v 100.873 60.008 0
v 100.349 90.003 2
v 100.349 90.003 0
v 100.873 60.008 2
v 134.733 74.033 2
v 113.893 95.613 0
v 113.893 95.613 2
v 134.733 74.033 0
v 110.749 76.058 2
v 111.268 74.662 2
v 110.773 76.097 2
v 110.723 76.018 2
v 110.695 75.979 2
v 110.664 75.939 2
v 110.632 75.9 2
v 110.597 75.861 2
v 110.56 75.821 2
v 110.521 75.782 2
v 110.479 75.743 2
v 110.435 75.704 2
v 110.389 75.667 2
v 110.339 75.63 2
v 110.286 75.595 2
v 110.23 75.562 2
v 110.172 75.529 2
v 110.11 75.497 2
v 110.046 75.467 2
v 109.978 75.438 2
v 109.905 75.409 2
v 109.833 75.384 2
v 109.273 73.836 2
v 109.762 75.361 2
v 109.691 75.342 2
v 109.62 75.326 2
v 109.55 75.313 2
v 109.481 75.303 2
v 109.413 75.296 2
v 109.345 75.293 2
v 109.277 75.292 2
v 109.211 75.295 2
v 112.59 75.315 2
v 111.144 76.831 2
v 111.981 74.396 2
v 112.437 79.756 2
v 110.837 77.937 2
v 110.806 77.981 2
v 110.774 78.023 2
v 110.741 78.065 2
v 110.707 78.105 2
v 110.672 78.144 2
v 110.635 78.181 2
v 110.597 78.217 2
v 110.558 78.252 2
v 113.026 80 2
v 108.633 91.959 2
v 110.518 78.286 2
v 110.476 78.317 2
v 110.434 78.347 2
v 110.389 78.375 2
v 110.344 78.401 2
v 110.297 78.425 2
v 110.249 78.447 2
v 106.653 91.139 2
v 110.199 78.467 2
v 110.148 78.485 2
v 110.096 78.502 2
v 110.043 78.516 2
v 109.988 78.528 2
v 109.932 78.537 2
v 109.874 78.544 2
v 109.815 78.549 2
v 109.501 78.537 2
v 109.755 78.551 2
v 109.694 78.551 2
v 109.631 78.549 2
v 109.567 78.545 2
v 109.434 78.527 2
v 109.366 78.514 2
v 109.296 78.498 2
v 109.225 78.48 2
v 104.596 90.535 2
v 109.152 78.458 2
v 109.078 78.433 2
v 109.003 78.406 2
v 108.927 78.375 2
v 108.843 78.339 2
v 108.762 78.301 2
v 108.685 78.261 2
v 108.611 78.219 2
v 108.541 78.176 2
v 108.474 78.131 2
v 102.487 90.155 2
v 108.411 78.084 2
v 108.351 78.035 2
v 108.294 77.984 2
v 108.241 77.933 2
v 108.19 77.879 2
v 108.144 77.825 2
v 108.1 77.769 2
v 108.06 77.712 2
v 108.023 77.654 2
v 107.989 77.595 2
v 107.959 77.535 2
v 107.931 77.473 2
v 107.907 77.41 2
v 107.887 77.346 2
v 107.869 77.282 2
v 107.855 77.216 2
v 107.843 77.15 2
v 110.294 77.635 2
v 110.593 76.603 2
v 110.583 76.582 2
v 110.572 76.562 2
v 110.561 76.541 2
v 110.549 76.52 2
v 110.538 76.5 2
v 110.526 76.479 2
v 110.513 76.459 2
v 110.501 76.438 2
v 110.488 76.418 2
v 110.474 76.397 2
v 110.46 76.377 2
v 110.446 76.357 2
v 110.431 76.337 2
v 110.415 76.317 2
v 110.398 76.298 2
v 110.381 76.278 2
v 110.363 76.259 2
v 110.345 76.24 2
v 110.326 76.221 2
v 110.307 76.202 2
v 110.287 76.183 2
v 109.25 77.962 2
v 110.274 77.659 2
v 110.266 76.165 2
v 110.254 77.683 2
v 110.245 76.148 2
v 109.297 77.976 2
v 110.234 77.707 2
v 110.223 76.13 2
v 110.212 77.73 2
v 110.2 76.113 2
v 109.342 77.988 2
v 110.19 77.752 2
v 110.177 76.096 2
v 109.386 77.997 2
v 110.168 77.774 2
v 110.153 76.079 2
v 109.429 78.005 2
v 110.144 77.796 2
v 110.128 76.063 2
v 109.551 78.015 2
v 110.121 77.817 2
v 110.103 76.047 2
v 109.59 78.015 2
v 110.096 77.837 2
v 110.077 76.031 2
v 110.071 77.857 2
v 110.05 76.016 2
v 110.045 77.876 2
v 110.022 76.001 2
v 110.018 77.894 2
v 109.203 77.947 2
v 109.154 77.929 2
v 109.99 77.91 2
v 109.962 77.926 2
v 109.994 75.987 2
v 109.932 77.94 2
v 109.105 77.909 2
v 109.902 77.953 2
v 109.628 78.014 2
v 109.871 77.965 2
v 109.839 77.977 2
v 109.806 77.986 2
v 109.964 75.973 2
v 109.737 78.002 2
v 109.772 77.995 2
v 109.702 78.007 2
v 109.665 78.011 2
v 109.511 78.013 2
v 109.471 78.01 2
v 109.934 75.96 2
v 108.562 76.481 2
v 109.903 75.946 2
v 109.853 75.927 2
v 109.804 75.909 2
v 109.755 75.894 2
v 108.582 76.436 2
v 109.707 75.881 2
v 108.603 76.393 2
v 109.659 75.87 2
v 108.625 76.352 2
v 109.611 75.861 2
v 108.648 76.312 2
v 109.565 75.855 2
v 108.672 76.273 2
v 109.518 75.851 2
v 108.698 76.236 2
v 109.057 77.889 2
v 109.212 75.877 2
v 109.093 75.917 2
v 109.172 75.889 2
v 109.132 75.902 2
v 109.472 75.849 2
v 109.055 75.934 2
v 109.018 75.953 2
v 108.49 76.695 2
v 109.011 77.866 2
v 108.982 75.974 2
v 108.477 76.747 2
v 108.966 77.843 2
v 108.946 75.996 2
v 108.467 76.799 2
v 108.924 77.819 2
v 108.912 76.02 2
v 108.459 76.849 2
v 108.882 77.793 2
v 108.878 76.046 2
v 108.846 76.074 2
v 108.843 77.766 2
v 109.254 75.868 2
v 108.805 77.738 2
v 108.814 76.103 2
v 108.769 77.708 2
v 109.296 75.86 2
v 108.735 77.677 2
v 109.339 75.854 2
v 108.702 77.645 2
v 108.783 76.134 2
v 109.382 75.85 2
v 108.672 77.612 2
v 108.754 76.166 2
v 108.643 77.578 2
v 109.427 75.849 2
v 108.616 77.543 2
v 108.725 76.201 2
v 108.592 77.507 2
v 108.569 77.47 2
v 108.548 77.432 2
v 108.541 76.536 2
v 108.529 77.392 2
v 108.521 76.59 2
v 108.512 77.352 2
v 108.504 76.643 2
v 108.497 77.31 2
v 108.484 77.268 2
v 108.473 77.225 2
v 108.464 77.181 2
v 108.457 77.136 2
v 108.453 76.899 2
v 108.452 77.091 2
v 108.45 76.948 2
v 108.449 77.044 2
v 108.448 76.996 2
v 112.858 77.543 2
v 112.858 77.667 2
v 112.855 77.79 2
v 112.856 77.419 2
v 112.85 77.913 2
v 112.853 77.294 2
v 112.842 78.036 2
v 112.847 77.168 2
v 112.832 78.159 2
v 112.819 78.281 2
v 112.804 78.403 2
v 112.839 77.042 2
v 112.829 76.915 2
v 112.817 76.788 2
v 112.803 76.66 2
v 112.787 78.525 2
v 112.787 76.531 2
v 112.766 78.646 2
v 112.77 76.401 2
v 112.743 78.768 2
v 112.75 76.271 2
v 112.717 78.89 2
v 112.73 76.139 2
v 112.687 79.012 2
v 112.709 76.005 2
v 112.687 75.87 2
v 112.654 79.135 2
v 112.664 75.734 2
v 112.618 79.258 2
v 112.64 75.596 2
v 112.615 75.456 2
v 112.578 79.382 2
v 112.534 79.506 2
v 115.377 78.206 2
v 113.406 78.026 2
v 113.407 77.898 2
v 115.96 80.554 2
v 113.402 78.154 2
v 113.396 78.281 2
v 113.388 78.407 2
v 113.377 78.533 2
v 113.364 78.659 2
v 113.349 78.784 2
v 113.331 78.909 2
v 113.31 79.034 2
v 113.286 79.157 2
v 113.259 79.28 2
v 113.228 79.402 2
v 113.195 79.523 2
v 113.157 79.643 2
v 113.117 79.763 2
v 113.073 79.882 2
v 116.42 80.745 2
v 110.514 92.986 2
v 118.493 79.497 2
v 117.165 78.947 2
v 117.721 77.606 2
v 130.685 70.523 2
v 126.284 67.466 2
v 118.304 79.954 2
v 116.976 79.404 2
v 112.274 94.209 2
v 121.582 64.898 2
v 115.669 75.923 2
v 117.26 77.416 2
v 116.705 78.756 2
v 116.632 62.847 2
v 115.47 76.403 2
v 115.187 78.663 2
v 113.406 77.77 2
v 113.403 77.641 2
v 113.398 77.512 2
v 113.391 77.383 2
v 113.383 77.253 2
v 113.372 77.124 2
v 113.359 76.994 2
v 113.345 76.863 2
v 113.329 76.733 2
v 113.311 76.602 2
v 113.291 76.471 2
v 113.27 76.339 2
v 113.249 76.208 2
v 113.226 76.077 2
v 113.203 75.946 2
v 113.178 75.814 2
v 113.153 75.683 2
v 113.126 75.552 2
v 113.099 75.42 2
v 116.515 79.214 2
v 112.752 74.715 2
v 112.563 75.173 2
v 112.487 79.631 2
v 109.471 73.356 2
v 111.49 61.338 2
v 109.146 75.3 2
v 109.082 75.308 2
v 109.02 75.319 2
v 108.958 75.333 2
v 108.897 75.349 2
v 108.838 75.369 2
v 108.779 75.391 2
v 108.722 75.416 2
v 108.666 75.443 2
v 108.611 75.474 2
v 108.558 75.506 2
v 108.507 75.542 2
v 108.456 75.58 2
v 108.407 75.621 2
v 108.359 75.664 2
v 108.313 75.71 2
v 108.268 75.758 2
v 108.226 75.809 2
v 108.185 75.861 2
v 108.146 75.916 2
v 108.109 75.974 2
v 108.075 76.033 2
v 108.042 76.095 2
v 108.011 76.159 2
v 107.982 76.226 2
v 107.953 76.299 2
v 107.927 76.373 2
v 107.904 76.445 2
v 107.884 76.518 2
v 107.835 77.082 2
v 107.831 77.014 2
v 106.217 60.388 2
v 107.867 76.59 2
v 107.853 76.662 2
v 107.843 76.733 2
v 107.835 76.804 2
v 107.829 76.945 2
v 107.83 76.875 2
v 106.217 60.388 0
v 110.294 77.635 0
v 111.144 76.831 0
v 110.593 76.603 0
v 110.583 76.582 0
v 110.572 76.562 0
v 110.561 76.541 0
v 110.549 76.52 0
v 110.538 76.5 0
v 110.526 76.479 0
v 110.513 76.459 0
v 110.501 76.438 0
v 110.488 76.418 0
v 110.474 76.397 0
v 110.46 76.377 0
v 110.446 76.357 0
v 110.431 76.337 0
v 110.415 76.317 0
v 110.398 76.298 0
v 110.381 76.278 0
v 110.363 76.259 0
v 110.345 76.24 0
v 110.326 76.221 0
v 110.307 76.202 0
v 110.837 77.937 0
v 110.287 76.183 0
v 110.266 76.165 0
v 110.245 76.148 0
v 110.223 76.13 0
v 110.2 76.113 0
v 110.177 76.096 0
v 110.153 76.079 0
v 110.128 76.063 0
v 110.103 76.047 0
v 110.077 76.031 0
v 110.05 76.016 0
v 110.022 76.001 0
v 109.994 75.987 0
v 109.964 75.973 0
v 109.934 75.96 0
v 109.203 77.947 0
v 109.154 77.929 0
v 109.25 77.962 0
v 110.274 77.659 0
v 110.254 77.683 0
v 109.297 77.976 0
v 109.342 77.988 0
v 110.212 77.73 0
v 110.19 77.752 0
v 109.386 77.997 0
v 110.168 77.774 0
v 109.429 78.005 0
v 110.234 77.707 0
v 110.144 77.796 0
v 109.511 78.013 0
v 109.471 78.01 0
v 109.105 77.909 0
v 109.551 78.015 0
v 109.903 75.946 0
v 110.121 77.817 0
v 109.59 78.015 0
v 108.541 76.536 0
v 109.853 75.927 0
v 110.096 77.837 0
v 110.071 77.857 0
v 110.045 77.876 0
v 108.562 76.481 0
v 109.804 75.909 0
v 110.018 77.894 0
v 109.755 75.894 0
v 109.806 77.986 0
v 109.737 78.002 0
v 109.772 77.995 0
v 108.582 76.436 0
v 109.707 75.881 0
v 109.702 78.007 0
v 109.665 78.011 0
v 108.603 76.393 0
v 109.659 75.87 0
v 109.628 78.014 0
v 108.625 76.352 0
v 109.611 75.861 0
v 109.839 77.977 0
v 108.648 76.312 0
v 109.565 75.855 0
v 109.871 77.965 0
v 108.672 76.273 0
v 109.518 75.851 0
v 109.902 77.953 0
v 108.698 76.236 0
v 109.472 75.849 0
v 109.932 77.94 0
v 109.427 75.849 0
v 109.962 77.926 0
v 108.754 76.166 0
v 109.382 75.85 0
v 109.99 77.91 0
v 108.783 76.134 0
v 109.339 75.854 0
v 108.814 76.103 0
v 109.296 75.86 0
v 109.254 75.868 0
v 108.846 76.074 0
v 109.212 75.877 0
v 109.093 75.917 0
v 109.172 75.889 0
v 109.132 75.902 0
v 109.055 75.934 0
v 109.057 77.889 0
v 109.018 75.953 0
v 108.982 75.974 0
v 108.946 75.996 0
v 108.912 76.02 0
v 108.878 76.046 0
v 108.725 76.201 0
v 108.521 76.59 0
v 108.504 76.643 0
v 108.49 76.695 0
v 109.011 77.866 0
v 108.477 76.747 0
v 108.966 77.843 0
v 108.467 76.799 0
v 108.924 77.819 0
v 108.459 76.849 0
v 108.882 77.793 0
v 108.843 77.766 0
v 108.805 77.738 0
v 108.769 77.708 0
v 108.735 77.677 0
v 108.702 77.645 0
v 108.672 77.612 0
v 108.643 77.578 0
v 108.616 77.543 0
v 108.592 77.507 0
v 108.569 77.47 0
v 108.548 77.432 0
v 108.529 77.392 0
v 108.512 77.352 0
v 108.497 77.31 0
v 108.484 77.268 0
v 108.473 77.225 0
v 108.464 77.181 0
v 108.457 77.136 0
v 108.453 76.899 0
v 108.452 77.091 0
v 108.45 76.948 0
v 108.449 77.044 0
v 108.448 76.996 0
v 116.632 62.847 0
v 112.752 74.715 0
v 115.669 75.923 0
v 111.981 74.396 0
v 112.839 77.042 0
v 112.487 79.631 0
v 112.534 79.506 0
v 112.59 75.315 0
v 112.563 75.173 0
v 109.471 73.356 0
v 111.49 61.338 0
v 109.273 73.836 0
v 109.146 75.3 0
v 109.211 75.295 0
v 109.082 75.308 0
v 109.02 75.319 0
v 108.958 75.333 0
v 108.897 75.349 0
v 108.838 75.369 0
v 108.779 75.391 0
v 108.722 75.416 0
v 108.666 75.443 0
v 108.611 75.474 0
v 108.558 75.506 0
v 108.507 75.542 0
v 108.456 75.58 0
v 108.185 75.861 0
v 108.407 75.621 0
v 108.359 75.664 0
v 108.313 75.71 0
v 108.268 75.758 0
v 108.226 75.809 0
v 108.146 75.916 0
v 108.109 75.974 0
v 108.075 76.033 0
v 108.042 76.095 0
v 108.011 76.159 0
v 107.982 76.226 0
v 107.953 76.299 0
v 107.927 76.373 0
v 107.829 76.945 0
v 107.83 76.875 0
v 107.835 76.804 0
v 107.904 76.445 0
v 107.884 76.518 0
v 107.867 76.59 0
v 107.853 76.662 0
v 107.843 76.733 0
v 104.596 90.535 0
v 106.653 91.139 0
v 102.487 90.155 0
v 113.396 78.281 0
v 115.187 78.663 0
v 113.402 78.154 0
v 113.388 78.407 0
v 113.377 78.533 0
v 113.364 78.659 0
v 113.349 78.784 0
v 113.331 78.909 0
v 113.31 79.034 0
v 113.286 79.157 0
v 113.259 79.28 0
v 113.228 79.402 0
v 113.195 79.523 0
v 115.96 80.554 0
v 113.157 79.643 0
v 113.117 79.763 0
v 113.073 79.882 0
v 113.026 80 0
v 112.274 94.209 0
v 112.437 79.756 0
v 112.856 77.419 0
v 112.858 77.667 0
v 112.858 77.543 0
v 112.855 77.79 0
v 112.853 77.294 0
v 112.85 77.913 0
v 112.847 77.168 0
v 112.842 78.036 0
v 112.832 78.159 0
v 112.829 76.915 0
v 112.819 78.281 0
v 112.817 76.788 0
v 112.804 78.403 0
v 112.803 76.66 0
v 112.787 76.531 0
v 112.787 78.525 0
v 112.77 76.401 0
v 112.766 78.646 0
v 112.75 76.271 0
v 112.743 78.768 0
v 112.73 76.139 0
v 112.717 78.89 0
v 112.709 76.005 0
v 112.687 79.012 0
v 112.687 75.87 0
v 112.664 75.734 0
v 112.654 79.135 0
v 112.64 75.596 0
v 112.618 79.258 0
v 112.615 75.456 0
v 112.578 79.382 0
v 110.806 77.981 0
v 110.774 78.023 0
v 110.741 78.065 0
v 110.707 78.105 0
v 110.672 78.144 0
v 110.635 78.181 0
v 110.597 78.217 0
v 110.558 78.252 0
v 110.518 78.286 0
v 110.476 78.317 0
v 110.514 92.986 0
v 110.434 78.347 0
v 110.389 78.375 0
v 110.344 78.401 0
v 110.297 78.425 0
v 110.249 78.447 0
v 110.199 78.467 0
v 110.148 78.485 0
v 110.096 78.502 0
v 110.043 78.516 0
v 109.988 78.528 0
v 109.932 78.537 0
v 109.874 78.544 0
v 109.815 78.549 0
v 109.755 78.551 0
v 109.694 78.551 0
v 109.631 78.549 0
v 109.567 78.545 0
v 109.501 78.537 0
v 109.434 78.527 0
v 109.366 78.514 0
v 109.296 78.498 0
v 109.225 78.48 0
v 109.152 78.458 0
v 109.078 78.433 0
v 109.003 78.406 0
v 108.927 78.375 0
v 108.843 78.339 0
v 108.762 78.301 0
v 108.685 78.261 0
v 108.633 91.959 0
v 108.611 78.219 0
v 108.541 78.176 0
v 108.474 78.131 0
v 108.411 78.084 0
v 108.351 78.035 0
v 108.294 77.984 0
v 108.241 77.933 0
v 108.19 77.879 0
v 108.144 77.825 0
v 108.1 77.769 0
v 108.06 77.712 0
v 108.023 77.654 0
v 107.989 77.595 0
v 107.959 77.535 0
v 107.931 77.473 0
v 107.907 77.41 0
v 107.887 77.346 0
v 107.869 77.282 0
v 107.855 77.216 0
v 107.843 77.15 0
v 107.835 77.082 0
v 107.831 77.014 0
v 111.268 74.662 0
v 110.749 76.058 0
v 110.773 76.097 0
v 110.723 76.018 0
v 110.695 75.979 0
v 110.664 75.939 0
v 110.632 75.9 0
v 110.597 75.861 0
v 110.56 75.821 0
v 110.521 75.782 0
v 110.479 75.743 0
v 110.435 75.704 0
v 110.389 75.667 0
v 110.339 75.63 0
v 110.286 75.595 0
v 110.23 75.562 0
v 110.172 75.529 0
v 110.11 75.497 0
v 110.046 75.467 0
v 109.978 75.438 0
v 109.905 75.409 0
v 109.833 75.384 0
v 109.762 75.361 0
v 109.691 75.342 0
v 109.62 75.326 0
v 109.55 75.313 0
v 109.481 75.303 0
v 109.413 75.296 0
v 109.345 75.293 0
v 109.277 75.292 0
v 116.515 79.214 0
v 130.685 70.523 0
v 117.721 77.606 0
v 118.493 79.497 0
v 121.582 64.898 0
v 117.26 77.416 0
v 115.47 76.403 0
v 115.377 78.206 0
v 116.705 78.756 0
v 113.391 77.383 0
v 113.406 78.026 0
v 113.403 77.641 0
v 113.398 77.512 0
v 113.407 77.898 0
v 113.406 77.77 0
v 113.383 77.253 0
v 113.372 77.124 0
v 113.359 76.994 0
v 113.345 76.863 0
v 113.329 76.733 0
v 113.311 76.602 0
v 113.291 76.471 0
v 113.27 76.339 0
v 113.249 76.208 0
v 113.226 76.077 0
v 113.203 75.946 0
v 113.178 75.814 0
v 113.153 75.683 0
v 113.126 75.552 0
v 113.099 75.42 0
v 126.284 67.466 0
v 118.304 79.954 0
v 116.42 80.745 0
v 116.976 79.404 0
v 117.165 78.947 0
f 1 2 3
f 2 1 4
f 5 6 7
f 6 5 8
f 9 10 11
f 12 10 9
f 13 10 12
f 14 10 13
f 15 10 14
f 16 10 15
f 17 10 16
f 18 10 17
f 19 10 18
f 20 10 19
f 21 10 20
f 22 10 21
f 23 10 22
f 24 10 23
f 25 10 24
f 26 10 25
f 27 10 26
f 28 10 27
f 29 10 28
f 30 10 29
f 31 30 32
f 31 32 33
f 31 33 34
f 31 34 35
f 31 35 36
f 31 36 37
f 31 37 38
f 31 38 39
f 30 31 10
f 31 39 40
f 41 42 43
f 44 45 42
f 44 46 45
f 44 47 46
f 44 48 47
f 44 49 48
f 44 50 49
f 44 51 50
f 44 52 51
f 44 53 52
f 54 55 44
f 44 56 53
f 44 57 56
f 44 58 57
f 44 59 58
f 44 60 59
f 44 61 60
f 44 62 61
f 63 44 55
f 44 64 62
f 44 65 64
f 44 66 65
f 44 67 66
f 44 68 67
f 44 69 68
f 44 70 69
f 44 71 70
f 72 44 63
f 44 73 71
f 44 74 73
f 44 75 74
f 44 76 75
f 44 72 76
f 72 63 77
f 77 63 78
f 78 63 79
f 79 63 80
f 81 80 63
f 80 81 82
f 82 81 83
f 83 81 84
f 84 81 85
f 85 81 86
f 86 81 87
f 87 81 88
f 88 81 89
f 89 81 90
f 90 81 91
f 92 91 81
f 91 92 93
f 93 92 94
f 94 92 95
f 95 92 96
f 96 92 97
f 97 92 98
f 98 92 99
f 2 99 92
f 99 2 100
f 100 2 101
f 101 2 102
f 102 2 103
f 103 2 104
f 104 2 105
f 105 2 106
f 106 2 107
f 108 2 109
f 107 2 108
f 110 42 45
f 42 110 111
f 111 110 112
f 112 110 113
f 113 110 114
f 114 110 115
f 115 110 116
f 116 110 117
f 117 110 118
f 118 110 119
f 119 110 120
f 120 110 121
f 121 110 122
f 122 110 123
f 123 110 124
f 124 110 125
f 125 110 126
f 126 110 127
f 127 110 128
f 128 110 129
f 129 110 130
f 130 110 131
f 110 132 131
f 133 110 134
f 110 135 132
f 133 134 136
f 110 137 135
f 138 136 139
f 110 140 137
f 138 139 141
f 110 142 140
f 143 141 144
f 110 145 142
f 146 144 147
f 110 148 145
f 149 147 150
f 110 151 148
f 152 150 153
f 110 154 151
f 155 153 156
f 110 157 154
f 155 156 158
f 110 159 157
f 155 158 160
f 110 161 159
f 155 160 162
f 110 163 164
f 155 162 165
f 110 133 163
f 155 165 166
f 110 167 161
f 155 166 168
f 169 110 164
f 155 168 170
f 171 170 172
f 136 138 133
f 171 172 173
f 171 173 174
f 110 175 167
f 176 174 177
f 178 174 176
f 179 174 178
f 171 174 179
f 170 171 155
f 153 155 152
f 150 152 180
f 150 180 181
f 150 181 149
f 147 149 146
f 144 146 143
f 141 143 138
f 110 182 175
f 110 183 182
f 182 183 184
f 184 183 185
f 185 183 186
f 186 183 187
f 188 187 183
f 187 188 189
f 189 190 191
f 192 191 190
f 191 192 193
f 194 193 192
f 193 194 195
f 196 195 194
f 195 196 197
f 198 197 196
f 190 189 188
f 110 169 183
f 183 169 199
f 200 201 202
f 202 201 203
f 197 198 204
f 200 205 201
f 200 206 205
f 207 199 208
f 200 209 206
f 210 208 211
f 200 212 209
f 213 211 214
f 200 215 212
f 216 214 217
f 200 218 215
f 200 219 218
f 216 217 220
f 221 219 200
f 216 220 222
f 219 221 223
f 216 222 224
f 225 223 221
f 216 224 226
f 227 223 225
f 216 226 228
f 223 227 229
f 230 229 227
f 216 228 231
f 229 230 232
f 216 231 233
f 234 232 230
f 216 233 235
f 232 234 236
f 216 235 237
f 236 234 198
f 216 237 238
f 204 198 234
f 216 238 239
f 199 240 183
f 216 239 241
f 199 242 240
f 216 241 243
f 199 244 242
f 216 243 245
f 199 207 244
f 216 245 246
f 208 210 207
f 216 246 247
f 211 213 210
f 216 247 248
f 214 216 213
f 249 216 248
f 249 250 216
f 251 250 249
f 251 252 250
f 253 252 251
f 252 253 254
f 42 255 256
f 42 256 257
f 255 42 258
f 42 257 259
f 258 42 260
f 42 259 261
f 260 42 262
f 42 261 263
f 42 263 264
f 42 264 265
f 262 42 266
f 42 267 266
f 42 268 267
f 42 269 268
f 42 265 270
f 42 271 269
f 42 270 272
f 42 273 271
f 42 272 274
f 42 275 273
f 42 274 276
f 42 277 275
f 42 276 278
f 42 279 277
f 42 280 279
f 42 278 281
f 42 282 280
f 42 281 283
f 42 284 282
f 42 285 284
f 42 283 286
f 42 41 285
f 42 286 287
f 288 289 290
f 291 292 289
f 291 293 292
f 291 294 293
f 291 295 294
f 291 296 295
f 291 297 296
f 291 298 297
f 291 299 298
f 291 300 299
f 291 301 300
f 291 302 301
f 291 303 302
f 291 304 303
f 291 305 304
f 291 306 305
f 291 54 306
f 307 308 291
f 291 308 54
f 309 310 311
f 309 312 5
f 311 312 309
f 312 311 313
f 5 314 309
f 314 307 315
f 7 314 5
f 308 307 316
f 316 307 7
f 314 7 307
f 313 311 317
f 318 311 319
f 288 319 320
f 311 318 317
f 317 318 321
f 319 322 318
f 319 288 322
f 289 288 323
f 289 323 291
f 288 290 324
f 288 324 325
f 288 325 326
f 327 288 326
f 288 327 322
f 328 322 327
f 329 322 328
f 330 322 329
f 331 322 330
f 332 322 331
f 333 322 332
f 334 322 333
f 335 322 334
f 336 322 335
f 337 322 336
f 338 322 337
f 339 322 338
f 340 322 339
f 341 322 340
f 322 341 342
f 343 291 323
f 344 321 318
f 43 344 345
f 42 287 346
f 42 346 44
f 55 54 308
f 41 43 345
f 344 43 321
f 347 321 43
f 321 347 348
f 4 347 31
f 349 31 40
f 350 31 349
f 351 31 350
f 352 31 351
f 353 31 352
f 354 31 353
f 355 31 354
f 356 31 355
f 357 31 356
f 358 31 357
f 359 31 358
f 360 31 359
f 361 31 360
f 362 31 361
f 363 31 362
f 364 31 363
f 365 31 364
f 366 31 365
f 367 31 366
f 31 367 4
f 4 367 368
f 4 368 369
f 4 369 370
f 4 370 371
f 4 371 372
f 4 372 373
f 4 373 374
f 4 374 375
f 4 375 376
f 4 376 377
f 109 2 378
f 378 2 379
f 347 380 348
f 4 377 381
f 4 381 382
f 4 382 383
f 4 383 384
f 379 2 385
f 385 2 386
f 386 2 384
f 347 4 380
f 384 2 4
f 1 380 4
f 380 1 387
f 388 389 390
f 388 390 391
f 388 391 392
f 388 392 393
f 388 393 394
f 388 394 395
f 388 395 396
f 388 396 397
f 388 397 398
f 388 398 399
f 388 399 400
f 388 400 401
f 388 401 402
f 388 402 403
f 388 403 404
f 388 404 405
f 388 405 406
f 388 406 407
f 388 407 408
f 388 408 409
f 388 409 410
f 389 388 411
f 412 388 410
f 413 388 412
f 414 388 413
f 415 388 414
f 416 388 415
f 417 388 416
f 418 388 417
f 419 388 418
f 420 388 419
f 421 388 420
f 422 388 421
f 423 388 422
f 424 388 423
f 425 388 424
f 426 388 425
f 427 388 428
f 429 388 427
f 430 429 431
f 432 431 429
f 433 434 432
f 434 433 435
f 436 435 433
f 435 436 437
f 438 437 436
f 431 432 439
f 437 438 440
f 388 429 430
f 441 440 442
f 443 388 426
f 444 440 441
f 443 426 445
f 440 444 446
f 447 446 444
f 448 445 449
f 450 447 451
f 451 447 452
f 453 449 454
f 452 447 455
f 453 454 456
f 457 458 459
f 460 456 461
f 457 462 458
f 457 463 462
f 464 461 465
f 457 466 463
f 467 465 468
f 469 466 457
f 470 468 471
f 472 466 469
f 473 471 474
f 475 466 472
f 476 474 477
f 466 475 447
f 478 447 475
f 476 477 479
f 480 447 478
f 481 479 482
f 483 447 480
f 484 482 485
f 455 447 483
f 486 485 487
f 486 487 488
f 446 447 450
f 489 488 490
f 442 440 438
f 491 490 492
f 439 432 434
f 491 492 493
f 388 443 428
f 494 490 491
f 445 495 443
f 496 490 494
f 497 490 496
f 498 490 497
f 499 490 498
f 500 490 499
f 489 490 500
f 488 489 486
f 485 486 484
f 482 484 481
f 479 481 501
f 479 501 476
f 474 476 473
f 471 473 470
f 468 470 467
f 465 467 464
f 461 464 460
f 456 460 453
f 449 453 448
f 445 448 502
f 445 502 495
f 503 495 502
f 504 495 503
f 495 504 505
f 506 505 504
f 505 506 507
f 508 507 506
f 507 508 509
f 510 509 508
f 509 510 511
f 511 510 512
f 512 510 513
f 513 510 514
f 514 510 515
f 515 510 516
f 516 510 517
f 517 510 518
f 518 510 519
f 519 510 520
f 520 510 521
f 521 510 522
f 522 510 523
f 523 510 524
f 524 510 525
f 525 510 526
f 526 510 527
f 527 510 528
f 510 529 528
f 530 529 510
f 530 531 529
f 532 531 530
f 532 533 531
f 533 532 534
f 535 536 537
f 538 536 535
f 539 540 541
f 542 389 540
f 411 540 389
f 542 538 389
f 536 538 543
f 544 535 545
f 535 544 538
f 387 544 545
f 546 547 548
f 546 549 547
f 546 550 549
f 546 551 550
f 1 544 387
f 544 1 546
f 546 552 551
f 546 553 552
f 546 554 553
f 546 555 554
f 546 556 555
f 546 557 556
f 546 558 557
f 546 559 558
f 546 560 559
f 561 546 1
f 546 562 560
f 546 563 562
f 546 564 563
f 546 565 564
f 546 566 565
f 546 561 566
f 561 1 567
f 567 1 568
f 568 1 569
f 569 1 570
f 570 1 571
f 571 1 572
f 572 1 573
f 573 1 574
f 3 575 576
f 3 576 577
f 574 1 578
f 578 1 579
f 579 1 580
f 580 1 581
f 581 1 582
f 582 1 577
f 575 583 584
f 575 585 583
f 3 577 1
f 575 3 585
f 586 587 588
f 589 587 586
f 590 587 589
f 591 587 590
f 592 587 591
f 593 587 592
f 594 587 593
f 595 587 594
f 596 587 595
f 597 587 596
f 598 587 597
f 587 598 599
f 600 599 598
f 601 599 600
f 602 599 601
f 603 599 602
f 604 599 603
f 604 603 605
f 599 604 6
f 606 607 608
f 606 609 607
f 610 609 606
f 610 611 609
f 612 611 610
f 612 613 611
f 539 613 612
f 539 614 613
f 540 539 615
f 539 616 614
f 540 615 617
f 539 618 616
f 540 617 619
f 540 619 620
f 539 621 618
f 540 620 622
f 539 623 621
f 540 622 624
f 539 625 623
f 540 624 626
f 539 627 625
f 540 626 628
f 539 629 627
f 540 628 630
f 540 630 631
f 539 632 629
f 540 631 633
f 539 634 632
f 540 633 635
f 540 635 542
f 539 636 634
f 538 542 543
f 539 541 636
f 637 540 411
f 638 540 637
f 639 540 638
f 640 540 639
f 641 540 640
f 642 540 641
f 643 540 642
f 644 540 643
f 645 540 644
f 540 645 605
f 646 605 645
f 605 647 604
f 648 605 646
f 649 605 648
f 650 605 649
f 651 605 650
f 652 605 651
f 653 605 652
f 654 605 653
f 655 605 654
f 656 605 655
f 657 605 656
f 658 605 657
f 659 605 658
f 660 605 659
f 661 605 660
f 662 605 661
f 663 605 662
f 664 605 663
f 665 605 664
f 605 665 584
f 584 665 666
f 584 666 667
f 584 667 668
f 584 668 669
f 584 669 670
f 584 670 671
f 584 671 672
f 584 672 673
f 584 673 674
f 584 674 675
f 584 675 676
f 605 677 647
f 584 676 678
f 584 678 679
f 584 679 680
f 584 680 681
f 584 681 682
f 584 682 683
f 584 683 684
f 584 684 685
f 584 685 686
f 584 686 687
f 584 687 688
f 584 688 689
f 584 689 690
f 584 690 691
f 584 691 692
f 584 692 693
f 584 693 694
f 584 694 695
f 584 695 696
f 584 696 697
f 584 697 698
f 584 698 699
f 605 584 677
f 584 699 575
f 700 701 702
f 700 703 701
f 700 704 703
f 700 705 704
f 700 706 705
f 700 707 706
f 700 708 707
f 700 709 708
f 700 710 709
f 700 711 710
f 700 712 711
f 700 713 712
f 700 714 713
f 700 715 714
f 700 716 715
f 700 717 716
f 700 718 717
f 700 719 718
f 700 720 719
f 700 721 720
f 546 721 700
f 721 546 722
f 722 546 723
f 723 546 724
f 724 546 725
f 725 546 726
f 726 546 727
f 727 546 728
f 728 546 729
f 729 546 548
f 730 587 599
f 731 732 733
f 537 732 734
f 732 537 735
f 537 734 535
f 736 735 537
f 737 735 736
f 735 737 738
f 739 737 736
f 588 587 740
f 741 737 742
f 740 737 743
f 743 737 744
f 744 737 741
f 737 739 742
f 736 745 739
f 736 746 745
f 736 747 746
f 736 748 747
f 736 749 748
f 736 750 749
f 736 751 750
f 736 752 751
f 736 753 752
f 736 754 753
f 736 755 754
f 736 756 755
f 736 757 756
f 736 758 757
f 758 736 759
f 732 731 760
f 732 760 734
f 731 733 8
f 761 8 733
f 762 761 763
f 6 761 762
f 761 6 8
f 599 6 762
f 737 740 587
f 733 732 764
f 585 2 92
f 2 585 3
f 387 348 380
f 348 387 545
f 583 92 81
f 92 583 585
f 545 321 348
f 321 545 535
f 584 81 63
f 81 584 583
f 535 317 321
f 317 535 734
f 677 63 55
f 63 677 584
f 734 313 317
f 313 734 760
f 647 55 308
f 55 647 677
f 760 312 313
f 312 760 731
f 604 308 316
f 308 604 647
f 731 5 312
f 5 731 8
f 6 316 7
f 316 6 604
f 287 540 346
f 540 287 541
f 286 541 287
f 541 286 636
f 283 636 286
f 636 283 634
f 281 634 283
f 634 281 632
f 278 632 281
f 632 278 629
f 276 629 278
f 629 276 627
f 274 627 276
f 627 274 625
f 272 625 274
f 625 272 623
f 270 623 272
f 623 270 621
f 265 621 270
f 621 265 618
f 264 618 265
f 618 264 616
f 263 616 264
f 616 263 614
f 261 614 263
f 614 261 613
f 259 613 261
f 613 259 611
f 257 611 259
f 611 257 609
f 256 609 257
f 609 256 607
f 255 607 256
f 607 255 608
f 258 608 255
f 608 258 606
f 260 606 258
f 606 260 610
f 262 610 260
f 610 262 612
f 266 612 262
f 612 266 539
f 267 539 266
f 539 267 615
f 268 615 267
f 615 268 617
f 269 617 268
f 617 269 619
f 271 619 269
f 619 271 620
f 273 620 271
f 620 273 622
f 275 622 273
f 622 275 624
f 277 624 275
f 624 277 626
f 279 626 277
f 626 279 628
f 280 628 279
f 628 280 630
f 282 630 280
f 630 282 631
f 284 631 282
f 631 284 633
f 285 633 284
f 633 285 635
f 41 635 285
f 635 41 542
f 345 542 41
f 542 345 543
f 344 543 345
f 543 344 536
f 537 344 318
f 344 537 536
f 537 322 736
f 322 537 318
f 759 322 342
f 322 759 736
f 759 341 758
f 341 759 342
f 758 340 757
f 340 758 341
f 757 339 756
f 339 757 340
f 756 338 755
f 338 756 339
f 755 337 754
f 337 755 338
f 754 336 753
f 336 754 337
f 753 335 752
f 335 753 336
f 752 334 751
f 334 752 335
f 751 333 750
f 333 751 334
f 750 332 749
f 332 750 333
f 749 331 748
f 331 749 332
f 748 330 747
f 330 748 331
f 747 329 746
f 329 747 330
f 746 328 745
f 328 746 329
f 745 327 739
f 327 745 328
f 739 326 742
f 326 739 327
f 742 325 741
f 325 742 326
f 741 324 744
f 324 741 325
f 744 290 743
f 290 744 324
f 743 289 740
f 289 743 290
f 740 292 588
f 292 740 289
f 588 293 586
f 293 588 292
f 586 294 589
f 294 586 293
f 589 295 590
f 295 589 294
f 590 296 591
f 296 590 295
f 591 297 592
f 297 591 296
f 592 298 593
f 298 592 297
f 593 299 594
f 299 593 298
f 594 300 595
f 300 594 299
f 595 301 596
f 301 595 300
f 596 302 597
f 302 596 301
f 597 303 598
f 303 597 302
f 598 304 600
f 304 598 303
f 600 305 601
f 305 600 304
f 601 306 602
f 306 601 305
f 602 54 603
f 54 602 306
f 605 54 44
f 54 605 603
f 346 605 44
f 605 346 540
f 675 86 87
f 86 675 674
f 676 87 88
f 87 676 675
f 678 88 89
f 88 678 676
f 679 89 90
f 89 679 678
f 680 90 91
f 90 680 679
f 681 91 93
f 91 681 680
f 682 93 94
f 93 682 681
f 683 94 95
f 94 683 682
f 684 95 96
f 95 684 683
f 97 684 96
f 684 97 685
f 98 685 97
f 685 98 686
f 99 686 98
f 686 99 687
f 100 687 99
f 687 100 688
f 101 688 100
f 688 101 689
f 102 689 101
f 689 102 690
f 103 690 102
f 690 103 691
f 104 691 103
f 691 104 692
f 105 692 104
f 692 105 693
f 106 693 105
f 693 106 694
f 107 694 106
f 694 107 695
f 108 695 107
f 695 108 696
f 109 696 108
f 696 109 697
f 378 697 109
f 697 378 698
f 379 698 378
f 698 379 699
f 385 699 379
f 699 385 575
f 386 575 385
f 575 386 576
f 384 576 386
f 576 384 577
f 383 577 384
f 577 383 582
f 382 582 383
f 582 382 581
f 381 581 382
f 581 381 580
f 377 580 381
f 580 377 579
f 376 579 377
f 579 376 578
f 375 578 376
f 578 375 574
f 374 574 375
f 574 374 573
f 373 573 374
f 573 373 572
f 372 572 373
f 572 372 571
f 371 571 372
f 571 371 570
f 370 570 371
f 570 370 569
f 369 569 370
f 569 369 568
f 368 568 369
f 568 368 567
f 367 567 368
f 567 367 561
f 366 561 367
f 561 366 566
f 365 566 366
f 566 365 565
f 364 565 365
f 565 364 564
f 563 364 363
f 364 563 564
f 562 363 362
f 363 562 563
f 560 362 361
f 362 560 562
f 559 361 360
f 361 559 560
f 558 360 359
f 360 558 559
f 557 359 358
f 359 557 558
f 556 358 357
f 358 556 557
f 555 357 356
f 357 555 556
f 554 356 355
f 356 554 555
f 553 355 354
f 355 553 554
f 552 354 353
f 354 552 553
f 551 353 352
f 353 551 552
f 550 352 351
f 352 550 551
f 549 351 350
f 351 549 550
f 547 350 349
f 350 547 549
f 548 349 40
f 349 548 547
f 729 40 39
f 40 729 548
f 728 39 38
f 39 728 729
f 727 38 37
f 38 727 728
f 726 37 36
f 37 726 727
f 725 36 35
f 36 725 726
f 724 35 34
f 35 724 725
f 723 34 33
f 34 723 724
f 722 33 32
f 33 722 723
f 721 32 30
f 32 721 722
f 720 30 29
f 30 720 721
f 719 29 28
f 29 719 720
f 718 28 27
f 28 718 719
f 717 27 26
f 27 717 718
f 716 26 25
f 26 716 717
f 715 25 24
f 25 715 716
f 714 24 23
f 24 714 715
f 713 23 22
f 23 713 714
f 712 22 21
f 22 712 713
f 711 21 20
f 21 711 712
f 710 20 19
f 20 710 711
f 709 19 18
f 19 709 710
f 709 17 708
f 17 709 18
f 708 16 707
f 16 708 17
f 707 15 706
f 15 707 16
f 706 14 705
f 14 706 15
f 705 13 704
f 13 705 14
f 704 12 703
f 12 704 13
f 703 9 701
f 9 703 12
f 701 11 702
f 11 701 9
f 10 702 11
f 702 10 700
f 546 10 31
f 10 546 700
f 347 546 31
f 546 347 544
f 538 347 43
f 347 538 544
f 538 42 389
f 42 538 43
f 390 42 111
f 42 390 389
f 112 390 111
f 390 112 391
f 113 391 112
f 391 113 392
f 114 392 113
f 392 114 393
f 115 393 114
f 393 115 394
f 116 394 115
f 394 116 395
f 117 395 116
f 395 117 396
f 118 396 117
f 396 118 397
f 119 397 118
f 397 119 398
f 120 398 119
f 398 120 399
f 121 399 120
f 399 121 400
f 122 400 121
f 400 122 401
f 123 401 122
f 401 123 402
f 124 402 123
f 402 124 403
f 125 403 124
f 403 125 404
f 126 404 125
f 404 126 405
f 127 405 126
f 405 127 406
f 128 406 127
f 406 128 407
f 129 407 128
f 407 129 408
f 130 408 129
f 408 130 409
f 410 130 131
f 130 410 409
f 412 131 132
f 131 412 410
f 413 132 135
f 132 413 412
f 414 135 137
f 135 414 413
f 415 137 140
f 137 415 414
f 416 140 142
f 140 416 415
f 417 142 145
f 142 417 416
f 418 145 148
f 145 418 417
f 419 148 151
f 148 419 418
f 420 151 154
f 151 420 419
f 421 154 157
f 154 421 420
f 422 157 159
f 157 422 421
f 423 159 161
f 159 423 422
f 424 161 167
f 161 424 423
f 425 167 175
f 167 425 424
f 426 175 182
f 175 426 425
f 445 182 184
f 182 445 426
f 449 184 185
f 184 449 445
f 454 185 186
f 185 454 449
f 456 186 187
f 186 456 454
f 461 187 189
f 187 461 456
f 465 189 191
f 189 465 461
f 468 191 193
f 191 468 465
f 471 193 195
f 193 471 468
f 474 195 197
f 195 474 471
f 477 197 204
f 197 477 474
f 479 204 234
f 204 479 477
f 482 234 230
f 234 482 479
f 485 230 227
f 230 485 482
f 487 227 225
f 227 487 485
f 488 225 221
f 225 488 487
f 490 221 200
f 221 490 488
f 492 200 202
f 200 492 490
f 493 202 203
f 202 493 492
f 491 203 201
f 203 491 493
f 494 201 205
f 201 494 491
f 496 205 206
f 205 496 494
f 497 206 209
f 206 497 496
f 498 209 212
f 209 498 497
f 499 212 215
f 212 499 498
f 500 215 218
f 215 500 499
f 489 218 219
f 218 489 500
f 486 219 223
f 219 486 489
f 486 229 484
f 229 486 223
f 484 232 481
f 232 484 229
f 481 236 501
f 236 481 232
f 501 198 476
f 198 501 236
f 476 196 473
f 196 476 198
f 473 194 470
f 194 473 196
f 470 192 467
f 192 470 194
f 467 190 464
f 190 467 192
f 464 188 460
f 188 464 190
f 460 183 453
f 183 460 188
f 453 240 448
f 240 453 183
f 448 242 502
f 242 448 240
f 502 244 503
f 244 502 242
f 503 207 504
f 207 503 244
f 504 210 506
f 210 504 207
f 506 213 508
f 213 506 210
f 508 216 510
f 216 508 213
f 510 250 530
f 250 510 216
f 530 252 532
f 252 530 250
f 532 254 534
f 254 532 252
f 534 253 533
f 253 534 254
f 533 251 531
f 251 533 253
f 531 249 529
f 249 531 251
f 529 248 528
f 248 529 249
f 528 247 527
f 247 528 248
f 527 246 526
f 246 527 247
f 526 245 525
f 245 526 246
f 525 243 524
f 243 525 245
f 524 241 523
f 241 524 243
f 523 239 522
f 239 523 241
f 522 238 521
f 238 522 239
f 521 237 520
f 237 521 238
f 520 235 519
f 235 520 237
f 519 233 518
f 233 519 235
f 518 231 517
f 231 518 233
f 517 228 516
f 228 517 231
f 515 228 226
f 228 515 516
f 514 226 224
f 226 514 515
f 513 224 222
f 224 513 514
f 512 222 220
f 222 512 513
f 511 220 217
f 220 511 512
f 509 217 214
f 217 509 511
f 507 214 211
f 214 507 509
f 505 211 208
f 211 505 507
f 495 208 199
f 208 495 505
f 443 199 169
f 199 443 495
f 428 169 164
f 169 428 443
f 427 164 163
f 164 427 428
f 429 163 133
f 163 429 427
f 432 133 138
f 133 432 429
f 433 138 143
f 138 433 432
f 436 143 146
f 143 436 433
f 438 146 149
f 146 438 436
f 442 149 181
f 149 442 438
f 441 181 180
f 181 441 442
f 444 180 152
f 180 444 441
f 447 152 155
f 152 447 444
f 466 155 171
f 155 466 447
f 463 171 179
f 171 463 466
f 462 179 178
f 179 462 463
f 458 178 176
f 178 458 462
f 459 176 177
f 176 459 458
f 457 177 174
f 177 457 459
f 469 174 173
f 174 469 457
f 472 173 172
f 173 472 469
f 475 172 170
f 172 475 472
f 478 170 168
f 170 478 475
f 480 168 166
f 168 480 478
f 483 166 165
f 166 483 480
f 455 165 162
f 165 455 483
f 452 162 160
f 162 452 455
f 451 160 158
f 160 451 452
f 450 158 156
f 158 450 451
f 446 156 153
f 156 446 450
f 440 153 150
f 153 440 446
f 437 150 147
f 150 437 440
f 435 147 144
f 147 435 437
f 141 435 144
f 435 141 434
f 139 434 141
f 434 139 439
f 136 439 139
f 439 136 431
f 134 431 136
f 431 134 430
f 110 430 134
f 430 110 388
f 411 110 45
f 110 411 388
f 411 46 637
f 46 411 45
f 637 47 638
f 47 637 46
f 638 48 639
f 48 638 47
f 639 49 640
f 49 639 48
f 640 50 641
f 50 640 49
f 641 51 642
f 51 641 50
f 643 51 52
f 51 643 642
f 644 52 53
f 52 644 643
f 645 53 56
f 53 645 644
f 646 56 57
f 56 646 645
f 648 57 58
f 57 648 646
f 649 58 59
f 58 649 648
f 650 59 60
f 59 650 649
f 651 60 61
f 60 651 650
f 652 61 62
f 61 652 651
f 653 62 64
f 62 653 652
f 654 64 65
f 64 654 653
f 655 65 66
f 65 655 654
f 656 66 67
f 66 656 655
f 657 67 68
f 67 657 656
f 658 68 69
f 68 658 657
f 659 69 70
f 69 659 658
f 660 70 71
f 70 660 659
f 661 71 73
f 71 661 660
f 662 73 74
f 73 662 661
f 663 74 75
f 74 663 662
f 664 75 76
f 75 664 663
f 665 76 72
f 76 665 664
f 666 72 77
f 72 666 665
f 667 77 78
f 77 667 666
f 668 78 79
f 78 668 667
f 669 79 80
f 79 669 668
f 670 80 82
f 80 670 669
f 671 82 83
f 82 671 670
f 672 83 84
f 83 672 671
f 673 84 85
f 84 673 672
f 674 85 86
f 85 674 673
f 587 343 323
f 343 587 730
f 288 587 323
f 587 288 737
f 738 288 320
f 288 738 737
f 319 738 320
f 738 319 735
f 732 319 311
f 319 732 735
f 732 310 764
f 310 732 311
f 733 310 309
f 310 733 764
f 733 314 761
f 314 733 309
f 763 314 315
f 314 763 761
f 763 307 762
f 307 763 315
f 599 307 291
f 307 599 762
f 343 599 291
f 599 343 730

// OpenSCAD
$fn = 64;
translate([100, 110, 0])
difference() {
    rotate([0, 0, 271])
        rotate_extrude(angle = 43)
            translate([20, 0]) square([30, 2]);
    
    translate([cos(292.5) * 35, sin(292.5) * 35, -0.1])
        rotate([0, 0, 292.5 - 90])
            linear_extrude(2.2)
                text("+75", size = 5, halign = "center", valign = "center");
}
